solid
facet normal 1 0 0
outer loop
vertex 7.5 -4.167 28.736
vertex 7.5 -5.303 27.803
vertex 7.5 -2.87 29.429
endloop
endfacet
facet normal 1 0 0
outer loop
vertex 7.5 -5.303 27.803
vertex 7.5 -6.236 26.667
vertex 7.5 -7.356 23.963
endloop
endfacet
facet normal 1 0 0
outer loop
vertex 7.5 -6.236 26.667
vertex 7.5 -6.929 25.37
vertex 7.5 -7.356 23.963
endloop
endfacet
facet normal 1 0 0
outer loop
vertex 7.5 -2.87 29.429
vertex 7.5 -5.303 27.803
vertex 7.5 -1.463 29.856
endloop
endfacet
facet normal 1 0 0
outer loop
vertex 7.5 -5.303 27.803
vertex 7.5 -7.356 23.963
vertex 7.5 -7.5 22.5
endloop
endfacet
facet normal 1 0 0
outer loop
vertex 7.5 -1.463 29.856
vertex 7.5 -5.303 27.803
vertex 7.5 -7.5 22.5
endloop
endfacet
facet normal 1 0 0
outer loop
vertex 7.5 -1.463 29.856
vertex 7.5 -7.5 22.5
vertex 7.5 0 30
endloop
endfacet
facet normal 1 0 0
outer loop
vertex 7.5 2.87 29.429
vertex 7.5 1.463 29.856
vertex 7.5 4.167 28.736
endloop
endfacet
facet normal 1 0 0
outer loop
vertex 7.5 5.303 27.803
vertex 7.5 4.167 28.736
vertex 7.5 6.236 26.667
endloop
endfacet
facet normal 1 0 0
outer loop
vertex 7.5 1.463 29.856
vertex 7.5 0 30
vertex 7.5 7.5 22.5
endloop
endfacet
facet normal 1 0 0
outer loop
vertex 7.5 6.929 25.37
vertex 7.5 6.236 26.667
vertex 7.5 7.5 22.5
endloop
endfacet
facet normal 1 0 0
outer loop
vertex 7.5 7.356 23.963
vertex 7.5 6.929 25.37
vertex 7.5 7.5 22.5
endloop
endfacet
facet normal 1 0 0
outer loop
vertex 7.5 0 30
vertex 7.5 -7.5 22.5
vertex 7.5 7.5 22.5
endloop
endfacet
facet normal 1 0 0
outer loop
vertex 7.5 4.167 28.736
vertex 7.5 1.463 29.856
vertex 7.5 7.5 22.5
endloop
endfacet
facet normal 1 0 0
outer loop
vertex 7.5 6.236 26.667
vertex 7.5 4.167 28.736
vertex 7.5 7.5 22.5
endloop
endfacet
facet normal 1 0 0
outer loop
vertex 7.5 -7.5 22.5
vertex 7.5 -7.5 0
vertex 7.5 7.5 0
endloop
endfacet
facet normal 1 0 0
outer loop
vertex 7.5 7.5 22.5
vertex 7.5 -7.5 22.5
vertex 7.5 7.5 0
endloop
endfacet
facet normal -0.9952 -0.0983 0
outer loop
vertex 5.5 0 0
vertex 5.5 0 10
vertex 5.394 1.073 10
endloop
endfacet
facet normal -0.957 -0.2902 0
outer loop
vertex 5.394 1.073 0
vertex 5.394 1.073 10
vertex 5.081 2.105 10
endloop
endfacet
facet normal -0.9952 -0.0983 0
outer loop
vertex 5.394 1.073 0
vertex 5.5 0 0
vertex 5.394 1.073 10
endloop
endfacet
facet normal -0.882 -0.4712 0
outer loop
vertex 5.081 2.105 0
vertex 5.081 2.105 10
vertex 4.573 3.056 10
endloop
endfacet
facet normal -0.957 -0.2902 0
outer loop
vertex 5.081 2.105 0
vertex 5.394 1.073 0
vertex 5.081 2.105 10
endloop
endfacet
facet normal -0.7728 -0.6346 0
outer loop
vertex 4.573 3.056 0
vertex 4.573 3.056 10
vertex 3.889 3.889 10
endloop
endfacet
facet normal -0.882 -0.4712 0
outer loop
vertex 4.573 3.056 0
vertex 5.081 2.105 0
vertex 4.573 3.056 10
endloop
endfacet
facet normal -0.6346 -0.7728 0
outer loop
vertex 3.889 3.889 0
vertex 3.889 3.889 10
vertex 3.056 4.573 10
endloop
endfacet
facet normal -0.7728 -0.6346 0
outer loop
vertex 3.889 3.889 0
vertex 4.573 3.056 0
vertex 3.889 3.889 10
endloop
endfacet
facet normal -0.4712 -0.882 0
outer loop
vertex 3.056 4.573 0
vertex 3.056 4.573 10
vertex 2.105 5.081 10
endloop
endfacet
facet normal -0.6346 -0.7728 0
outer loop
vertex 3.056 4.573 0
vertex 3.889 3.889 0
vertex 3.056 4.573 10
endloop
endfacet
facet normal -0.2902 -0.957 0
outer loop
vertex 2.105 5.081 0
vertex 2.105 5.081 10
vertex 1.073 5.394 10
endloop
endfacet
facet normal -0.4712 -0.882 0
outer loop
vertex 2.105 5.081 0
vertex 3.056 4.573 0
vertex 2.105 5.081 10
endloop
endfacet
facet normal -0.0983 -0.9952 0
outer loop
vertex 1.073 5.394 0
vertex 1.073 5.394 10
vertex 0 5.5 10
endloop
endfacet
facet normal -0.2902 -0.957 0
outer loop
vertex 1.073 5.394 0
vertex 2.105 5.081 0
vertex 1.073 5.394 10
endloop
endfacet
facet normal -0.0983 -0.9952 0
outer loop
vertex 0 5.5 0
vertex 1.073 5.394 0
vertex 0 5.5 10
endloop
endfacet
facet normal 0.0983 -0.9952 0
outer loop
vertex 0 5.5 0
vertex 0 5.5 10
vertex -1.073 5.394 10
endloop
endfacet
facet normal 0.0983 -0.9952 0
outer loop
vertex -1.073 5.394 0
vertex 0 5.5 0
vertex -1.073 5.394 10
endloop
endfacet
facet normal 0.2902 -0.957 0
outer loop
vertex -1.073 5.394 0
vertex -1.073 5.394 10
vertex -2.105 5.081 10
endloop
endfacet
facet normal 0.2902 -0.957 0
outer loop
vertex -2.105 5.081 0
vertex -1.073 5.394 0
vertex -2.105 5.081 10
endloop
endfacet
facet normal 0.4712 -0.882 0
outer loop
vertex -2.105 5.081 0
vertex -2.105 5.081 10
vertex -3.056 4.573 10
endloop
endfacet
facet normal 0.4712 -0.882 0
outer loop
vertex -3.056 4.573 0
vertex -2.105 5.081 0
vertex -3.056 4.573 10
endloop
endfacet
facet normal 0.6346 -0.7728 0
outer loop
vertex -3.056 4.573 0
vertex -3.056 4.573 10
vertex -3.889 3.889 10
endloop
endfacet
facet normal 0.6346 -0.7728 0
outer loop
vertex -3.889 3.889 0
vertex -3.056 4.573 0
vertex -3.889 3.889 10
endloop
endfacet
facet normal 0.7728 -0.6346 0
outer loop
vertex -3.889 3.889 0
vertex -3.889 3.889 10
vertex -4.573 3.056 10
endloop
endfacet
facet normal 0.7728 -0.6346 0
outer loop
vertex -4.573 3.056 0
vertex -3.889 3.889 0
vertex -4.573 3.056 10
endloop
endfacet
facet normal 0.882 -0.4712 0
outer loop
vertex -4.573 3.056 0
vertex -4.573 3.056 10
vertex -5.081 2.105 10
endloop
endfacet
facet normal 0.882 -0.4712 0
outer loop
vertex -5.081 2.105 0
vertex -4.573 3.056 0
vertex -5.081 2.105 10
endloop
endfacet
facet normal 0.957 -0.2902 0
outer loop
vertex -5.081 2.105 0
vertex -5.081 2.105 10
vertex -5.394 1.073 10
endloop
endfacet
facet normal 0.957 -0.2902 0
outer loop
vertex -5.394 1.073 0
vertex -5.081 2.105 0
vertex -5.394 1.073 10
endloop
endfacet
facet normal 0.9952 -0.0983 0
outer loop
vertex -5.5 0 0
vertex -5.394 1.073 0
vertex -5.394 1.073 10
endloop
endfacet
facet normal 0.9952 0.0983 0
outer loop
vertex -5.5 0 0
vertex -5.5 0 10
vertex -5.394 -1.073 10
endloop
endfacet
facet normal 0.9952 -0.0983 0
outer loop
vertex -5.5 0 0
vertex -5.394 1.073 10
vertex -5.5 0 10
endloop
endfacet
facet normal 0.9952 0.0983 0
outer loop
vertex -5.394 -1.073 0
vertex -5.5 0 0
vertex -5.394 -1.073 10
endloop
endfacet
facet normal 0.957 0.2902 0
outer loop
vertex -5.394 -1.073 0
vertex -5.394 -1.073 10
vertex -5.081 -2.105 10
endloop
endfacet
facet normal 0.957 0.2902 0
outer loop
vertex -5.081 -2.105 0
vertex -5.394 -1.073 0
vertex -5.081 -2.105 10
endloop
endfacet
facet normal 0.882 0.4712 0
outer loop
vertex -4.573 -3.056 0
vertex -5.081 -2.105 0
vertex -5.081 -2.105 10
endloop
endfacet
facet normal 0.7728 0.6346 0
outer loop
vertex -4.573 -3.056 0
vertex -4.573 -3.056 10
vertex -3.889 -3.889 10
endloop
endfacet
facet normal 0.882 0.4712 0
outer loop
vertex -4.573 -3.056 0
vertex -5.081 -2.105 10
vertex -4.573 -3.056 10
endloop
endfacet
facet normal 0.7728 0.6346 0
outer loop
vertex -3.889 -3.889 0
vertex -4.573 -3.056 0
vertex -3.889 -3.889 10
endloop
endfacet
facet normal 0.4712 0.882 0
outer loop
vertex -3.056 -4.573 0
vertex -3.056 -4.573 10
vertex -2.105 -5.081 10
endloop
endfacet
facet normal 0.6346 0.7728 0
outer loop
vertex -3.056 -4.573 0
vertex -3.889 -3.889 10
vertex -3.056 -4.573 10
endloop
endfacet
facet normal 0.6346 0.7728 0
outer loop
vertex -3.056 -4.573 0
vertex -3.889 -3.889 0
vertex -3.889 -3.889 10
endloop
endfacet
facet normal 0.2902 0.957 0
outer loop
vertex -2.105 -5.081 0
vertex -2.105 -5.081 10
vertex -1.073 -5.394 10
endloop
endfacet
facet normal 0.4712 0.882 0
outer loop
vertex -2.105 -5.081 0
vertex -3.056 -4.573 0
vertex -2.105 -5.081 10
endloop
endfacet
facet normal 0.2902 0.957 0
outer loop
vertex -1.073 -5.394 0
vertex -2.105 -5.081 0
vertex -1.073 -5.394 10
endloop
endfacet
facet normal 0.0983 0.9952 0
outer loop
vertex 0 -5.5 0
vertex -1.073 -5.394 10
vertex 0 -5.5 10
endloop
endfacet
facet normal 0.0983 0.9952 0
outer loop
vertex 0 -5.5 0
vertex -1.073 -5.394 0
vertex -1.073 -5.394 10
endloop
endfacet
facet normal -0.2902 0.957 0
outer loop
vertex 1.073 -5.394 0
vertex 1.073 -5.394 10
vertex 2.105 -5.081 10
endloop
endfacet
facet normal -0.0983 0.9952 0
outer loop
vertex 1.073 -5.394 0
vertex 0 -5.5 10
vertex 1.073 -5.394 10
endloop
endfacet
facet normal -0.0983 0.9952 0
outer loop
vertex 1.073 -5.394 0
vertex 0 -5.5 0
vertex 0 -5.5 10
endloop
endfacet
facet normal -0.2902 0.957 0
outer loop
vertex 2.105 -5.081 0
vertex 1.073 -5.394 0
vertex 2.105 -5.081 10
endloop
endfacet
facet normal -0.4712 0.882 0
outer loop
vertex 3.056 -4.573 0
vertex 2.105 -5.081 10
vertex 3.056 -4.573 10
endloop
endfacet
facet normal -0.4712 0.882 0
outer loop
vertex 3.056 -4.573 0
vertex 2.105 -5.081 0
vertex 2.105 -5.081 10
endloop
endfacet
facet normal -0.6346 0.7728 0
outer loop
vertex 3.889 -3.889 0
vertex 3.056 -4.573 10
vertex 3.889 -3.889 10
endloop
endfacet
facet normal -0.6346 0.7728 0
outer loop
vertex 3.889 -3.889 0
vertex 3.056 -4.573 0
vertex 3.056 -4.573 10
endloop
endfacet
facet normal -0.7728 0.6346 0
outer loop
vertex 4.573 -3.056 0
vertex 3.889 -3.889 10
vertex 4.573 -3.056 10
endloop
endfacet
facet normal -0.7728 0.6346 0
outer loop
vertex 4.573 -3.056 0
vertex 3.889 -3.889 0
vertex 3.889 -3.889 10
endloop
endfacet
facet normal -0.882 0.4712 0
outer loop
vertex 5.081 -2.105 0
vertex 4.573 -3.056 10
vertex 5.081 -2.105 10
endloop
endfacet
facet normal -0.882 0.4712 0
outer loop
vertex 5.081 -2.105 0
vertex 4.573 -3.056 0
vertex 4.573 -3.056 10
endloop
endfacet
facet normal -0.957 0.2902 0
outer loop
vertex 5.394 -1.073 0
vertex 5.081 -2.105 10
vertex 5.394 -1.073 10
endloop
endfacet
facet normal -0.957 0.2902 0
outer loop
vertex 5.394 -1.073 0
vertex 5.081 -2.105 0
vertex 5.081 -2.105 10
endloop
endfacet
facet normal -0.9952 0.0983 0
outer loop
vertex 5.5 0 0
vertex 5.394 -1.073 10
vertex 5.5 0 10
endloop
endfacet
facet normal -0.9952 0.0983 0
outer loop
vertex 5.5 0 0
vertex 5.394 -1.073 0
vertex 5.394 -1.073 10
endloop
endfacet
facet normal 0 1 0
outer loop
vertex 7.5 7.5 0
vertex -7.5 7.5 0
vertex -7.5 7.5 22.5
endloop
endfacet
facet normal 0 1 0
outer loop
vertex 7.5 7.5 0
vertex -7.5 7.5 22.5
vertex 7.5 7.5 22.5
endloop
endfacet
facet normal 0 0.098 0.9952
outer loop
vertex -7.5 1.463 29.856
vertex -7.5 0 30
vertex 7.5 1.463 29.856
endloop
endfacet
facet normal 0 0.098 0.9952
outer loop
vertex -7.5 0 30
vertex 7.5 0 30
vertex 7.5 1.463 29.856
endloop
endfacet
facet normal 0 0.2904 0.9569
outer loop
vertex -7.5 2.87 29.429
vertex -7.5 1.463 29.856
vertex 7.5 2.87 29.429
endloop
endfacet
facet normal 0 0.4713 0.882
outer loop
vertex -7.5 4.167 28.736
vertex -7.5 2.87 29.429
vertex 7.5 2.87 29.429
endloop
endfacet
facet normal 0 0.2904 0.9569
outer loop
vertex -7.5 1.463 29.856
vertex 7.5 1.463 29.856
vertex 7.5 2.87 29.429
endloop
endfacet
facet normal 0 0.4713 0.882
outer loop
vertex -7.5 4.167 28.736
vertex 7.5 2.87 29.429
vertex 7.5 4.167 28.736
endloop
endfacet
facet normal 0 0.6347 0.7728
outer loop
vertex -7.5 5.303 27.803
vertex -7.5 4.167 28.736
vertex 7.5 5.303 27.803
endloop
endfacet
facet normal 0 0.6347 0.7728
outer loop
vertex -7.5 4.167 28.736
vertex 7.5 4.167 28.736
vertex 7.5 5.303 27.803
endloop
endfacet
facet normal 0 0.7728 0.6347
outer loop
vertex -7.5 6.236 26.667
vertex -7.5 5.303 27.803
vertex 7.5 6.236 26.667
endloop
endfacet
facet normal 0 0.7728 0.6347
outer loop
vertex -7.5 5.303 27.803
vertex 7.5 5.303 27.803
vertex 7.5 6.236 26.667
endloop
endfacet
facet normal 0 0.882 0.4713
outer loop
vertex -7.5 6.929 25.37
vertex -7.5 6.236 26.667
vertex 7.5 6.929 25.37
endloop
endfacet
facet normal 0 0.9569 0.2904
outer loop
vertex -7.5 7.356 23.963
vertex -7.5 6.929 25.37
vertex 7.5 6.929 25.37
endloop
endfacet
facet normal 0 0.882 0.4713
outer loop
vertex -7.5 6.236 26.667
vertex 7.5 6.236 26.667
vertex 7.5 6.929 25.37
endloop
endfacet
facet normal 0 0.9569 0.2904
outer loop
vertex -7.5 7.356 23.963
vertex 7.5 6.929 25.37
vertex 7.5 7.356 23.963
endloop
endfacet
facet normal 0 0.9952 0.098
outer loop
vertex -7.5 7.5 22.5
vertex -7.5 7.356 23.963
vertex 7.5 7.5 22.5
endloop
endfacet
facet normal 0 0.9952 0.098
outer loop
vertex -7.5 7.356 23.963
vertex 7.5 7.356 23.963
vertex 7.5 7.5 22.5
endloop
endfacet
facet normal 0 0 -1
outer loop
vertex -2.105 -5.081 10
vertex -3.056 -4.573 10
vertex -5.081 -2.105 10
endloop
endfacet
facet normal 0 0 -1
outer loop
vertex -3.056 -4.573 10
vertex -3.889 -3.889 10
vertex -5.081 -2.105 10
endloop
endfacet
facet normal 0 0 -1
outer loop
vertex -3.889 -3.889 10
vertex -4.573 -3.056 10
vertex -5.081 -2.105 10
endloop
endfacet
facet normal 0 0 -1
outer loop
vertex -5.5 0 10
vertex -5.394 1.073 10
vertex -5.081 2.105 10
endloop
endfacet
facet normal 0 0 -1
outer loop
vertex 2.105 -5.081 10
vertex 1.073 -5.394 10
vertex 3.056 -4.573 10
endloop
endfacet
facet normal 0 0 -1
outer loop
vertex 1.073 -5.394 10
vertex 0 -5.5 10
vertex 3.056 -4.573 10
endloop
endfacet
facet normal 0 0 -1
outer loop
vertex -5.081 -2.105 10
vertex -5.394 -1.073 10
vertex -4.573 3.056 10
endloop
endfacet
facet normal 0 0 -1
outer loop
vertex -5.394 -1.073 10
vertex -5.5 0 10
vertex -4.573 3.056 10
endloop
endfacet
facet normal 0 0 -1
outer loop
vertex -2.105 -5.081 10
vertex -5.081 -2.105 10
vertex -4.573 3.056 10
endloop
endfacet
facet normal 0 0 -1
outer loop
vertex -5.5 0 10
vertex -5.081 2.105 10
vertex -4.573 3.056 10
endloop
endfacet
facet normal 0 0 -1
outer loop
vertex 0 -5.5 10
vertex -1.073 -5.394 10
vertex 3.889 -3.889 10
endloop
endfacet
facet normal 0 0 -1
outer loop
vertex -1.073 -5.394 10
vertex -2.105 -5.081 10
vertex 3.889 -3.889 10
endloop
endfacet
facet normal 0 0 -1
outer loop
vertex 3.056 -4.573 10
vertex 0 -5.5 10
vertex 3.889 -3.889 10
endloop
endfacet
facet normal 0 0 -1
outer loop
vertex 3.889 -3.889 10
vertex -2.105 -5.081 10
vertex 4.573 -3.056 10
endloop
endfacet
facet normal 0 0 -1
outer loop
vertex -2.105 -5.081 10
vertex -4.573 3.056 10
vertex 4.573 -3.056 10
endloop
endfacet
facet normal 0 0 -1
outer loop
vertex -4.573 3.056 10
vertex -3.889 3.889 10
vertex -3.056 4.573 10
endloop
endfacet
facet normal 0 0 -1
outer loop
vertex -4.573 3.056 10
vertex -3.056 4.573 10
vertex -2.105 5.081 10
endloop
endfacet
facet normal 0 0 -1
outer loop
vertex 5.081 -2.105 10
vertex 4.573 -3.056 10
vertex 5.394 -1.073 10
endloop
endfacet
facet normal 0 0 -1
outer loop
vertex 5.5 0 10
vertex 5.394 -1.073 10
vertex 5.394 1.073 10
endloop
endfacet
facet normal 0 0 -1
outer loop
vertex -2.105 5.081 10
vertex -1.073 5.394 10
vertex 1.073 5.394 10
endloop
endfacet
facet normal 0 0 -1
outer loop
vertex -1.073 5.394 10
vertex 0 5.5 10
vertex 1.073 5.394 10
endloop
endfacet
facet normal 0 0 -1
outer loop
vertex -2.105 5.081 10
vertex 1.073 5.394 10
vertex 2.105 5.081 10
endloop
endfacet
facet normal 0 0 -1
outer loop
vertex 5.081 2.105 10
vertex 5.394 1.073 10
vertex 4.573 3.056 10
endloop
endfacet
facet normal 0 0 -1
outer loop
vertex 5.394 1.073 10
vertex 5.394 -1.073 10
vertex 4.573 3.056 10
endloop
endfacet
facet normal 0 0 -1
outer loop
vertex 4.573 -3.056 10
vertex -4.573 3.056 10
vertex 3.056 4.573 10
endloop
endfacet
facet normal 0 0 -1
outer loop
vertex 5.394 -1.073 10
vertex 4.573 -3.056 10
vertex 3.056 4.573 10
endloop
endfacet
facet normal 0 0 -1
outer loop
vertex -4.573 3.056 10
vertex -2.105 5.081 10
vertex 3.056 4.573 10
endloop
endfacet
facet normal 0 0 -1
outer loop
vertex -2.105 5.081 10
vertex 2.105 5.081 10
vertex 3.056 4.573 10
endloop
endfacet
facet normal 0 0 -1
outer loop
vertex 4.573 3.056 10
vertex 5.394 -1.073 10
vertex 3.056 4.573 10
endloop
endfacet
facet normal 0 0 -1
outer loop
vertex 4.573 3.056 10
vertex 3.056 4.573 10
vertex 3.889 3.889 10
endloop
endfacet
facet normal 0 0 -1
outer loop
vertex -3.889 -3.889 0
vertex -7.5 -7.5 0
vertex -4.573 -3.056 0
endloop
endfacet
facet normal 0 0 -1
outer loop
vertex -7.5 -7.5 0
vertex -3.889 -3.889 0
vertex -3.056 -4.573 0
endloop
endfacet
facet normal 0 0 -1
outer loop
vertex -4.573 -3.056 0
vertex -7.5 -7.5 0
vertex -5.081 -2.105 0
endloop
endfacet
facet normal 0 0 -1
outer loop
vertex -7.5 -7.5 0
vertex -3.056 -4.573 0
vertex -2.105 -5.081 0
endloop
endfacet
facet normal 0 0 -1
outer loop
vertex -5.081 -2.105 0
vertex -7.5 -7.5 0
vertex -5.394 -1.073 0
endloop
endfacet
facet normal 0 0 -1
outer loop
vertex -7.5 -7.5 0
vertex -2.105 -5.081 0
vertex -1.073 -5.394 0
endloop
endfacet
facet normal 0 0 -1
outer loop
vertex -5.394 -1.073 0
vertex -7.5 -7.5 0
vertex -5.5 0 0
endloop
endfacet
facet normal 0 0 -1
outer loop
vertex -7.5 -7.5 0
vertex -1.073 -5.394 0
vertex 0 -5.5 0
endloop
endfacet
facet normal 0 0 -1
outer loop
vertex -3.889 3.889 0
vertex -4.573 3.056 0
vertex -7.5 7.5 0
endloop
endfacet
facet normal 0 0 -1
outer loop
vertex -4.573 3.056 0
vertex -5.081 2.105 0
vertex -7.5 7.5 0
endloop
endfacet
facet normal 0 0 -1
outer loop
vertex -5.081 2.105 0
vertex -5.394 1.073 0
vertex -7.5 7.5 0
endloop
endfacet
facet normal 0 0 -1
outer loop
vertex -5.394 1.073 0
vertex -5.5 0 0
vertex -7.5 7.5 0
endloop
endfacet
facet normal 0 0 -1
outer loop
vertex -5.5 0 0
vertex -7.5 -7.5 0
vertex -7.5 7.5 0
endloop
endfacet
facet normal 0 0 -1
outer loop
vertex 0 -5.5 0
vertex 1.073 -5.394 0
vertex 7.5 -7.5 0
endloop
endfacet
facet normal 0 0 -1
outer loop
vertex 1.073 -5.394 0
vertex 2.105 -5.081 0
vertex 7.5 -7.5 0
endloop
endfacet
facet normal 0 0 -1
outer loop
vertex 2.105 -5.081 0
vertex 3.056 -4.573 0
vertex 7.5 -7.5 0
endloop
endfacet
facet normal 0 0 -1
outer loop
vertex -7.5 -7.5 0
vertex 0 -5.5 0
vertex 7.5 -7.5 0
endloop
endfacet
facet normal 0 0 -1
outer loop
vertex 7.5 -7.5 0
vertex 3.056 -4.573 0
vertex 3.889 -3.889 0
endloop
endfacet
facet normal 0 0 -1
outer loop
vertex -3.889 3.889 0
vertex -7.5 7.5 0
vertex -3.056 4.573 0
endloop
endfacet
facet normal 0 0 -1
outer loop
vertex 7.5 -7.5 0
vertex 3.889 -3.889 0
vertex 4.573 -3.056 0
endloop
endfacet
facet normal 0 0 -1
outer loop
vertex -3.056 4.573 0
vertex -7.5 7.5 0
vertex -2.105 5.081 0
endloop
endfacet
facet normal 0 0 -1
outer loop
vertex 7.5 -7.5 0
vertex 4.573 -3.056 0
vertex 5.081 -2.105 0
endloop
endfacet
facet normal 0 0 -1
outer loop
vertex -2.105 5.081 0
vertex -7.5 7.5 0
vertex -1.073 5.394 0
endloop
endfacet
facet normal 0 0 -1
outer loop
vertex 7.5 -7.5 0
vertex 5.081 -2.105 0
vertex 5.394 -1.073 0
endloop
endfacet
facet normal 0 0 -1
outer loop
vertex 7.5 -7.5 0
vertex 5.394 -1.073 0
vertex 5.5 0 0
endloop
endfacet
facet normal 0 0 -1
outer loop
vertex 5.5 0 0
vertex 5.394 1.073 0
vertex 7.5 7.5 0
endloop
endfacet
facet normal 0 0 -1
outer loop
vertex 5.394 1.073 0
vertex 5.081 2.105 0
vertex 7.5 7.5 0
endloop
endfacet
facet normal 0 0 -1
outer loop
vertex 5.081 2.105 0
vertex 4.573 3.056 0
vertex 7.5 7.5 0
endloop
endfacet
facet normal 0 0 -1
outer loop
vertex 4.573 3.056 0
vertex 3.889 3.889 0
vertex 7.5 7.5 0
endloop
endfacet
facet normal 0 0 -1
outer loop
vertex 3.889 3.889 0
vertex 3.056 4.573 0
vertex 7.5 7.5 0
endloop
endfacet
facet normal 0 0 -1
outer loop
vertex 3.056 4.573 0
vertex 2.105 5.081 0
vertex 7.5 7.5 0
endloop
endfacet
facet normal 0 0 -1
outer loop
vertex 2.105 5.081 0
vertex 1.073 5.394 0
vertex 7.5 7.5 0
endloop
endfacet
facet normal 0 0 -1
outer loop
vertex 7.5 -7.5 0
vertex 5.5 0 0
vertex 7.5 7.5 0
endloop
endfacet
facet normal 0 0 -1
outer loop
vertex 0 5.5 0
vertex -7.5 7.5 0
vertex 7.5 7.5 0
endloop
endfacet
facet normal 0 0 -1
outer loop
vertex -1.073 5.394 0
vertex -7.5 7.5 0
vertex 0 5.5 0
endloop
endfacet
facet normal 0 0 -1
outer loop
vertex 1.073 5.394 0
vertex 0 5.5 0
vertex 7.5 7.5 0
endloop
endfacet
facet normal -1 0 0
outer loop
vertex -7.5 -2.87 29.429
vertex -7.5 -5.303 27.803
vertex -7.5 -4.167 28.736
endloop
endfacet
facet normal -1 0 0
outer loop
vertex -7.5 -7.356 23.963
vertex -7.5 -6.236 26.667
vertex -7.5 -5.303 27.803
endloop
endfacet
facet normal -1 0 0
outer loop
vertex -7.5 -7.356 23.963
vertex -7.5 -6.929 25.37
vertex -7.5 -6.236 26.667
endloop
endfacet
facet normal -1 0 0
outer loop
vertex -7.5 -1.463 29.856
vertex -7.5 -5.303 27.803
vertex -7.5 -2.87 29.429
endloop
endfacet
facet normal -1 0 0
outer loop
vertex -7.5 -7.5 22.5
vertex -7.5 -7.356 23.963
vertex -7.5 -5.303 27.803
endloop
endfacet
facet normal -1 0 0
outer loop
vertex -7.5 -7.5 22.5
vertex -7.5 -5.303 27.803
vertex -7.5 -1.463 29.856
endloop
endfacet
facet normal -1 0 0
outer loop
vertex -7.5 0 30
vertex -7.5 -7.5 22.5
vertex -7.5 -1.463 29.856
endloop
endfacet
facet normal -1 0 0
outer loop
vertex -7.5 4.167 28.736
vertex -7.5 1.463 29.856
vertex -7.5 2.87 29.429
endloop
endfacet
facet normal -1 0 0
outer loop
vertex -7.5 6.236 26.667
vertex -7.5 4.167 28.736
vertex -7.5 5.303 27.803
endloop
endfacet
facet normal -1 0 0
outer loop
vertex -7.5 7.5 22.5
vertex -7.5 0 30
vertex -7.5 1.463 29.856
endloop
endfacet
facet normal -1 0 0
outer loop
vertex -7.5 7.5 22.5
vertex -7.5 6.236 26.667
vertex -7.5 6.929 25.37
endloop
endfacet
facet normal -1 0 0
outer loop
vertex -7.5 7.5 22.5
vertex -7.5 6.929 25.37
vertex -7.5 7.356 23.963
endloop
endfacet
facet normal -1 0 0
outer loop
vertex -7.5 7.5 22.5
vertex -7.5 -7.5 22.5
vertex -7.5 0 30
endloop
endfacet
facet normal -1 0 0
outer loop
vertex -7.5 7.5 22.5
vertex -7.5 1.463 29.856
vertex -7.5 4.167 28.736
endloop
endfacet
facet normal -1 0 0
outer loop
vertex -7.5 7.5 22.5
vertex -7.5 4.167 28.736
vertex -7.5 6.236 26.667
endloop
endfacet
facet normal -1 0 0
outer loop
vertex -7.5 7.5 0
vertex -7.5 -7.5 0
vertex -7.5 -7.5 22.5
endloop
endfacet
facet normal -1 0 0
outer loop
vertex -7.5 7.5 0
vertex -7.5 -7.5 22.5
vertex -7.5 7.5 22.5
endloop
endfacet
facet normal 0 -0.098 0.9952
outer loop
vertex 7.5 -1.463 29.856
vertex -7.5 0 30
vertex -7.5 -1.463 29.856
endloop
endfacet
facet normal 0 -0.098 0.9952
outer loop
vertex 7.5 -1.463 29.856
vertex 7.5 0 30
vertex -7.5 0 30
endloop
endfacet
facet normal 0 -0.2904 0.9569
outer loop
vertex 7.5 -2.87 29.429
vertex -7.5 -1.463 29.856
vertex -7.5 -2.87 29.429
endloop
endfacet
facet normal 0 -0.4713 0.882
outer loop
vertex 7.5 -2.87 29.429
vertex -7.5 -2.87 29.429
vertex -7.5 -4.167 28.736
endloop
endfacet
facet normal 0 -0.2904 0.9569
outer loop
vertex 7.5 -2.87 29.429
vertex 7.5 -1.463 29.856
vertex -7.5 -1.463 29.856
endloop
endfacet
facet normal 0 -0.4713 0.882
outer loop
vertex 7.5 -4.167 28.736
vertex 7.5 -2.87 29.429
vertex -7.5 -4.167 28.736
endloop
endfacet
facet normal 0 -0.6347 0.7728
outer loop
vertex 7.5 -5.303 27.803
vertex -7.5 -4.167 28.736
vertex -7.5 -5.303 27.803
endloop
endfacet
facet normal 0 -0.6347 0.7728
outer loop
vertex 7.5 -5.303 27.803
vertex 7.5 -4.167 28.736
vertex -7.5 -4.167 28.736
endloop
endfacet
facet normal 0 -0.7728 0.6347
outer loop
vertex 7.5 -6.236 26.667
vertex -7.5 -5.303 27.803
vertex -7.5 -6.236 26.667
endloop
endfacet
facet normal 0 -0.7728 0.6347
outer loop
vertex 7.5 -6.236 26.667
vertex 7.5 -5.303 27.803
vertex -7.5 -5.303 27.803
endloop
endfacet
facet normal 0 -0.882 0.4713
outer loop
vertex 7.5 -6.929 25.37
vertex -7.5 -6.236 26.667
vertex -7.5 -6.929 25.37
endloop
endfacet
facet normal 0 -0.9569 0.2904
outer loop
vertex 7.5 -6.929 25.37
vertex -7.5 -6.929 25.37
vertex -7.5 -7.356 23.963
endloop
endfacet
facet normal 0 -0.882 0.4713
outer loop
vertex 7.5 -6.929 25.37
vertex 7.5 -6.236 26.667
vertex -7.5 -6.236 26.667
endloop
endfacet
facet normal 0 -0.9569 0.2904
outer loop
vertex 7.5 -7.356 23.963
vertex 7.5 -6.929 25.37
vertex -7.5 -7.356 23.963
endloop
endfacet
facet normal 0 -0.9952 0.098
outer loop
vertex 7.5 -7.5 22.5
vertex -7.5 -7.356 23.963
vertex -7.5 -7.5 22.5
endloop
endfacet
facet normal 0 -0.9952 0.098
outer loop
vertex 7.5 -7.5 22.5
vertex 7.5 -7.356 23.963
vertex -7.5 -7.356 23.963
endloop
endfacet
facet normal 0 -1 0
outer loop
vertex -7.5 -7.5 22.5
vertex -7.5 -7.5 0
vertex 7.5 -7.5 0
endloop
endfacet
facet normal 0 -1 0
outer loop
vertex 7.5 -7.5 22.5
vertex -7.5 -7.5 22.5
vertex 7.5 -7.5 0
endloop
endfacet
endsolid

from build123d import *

# Parameters (mm, degrees)
SKETCH_1_W      = 15
SKETCH_1_H      = 15
SKETCH_1_R      = 5.5
EXTRUDE_1_DEPTH = 30
SKETCH_5_W      = 15
SKETCH_5_H      = 15
EXTRUDE_3_DEPTH = 20
FILLET_2_R      = 7.5


with BuildPart() as part:
    # ｽｹｯﾁ1 → ﾎﾞｽ - 押し出し1 (new body)
    with BuildSketch(Plane.XY):
        Rectangle(SKETCH_1_W, SKETCH_1_H)
        Circle(SKETCH_1_R, mode=Mode.SUBTRACT)
    extrude(amount=EXTRUDE_1_DEPTH)

    # ｽｹｯﾁ5 → ﾎﾞｽ - 押し出し3 (add)
    with BuildSketch(Plane.XY.offset(30)):
        Rectangle(SKETCH_5_W, SKETCH_5_H)
    extrude(amount=-EXTRUDE_3_DEPTH)

    # ﾌｨﾚｯﾄ2
    fillet_2_edges = [part.edges().sort_by_distance(p)[0] for p in [
        (0, -7.5, 30),
        (0, 7.5, 30),
    ]]
    fillet(fillet_2_edges, radius=FILLET_2_R - 0.0001)  # a hair under: the kernel refuses the full size


solid = part.part
